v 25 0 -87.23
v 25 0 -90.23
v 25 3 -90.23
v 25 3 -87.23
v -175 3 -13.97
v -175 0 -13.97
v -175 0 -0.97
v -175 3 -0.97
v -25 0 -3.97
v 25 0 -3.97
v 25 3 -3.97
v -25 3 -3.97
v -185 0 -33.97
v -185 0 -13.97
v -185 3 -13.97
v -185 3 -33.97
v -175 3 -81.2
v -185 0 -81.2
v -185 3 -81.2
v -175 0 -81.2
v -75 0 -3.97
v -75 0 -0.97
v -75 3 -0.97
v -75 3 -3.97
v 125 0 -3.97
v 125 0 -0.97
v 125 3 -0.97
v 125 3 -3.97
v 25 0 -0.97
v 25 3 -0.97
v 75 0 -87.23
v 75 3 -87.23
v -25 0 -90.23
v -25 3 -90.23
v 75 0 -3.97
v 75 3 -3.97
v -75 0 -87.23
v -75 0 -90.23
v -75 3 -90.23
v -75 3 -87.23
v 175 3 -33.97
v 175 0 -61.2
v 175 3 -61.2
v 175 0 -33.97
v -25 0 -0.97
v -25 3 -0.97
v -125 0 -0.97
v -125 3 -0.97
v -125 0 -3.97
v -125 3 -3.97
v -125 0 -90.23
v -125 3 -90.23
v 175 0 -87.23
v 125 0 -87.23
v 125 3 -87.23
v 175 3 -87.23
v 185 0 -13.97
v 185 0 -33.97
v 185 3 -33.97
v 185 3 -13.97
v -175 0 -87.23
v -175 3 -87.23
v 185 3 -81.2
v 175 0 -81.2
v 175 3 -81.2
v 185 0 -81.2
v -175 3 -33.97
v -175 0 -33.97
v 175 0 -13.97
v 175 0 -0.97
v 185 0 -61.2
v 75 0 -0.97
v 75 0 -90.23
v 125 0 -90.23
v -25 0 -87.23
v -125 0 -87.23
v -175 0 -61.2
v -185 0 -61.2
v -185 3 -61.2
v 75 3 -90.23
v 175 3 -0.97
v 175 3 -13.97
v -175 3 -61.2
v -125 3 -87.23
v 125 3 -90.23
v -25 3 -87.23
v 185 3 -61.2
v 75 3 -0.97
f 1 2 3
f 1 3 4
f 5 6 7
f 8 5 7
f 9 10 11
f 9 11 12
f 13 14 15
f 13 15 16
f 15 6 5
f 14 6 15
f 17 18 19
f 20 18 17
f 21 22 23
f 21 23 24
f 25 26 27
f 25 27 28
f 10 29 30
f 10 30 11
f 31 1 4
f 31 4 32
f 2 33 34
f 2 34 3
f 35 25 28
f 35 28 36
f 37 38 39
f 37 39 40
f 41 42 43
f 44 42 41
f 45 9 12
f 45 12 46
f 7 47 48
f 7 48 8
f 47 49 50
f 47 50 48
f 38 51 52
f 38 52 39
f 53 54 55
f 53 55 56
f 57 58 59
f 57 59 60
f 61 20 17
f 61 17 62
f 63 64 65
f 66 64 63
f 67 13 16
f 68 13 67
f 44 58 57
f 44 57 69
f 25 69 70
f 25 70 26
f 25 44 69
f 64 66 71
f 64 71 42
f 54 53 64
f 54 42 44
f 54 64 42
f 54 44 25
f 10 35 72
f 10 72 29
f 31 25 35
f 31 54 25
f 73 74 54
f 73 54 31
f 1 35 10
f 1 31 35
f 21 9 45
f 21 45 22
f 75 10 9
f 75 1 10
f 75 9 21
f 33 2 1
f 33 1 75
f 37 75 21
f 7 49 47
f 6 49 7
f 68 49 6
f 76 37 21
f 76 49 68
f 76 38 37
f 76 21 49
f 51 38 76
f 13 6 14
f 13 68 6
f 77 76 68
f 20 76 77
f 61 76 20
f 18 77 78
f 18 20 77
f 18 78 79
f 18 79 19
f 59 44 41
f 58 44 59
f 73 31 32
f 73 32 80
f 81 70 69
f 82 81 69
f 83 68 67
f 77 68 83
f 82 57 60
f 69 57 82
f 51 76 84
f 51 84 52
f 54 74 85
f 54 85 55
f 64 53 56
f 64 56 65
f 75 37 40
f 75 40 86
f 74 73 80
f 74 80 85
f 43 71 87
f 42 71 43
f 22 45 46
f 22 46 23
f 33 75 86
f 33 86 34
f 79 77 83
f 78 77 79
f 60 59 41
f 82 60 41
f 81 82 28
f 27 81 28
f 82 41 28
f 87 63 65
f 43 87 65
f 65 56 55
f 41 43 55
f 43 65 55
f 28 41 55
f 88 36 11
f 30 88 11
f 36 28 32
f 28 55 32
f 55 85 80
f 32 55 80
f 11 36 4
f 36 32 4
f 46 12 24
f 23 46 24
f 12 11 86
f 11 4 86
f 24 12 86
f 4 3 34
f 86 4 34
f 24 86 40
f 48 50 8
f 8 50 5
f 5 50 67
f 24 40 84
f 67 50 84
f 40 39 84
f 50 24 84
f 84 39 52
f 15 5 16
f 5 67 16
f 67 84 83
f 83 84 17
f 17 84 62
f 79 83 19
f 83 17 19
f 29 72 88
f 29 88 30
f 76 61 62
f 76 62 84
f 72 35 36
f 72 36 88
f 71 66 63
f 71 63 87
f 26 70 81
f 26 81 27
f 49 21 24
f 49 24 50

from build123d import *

# Parameters (mm, degrees)
EXTRUDE_1_DEPTH = 3


with BuildPart() as part:
    # 스케치1 → 보스-돌출1 (new body)
    with BuildSketch(Plane(origin=(0, 0, 0), x_dir=(1, 0, 0), z_dir=(0, 1, 0))):
        Polygon((-175, 3.97), (-175, 13.97), (-185, 13.97), (-185, 33.97), (-175, 33.97), (-175, 61.2), (-185, 61.2), (-185, 81.2), (-175, 81.2), (-175, 87.23), (-125, 87.23), (-125, 90.23), (-75, 90.23), (-75, 87.23), (-25, 87.23), (-25, 90.23), (25, 90.23), (25, 87.23), (75, 87.23), (75, 90.23), (125, 90.23), (125, 87.23), (175, 87.23), (175, 81.2), (185, 81.2), (185, 61.2), (175, 61.2), (175, 33.97), (185, 33.97), (185, 13.97), (175, 13.97), (175, 3.97), (175, 0.97), (125, 0.97), (125, 3.97), (75, 3.97), (75, 0.97), (25, 0.97), (25, 3.97), (-25, 3.97), (-25, 0.97), (-75, 0.97), (-75, 3.97), (-125, 3.97), (-125, 0.97), (-175, 0.97), align=None)
    extrude(amount=EXTRUDE_1_DEPTH)


solid = part.part
